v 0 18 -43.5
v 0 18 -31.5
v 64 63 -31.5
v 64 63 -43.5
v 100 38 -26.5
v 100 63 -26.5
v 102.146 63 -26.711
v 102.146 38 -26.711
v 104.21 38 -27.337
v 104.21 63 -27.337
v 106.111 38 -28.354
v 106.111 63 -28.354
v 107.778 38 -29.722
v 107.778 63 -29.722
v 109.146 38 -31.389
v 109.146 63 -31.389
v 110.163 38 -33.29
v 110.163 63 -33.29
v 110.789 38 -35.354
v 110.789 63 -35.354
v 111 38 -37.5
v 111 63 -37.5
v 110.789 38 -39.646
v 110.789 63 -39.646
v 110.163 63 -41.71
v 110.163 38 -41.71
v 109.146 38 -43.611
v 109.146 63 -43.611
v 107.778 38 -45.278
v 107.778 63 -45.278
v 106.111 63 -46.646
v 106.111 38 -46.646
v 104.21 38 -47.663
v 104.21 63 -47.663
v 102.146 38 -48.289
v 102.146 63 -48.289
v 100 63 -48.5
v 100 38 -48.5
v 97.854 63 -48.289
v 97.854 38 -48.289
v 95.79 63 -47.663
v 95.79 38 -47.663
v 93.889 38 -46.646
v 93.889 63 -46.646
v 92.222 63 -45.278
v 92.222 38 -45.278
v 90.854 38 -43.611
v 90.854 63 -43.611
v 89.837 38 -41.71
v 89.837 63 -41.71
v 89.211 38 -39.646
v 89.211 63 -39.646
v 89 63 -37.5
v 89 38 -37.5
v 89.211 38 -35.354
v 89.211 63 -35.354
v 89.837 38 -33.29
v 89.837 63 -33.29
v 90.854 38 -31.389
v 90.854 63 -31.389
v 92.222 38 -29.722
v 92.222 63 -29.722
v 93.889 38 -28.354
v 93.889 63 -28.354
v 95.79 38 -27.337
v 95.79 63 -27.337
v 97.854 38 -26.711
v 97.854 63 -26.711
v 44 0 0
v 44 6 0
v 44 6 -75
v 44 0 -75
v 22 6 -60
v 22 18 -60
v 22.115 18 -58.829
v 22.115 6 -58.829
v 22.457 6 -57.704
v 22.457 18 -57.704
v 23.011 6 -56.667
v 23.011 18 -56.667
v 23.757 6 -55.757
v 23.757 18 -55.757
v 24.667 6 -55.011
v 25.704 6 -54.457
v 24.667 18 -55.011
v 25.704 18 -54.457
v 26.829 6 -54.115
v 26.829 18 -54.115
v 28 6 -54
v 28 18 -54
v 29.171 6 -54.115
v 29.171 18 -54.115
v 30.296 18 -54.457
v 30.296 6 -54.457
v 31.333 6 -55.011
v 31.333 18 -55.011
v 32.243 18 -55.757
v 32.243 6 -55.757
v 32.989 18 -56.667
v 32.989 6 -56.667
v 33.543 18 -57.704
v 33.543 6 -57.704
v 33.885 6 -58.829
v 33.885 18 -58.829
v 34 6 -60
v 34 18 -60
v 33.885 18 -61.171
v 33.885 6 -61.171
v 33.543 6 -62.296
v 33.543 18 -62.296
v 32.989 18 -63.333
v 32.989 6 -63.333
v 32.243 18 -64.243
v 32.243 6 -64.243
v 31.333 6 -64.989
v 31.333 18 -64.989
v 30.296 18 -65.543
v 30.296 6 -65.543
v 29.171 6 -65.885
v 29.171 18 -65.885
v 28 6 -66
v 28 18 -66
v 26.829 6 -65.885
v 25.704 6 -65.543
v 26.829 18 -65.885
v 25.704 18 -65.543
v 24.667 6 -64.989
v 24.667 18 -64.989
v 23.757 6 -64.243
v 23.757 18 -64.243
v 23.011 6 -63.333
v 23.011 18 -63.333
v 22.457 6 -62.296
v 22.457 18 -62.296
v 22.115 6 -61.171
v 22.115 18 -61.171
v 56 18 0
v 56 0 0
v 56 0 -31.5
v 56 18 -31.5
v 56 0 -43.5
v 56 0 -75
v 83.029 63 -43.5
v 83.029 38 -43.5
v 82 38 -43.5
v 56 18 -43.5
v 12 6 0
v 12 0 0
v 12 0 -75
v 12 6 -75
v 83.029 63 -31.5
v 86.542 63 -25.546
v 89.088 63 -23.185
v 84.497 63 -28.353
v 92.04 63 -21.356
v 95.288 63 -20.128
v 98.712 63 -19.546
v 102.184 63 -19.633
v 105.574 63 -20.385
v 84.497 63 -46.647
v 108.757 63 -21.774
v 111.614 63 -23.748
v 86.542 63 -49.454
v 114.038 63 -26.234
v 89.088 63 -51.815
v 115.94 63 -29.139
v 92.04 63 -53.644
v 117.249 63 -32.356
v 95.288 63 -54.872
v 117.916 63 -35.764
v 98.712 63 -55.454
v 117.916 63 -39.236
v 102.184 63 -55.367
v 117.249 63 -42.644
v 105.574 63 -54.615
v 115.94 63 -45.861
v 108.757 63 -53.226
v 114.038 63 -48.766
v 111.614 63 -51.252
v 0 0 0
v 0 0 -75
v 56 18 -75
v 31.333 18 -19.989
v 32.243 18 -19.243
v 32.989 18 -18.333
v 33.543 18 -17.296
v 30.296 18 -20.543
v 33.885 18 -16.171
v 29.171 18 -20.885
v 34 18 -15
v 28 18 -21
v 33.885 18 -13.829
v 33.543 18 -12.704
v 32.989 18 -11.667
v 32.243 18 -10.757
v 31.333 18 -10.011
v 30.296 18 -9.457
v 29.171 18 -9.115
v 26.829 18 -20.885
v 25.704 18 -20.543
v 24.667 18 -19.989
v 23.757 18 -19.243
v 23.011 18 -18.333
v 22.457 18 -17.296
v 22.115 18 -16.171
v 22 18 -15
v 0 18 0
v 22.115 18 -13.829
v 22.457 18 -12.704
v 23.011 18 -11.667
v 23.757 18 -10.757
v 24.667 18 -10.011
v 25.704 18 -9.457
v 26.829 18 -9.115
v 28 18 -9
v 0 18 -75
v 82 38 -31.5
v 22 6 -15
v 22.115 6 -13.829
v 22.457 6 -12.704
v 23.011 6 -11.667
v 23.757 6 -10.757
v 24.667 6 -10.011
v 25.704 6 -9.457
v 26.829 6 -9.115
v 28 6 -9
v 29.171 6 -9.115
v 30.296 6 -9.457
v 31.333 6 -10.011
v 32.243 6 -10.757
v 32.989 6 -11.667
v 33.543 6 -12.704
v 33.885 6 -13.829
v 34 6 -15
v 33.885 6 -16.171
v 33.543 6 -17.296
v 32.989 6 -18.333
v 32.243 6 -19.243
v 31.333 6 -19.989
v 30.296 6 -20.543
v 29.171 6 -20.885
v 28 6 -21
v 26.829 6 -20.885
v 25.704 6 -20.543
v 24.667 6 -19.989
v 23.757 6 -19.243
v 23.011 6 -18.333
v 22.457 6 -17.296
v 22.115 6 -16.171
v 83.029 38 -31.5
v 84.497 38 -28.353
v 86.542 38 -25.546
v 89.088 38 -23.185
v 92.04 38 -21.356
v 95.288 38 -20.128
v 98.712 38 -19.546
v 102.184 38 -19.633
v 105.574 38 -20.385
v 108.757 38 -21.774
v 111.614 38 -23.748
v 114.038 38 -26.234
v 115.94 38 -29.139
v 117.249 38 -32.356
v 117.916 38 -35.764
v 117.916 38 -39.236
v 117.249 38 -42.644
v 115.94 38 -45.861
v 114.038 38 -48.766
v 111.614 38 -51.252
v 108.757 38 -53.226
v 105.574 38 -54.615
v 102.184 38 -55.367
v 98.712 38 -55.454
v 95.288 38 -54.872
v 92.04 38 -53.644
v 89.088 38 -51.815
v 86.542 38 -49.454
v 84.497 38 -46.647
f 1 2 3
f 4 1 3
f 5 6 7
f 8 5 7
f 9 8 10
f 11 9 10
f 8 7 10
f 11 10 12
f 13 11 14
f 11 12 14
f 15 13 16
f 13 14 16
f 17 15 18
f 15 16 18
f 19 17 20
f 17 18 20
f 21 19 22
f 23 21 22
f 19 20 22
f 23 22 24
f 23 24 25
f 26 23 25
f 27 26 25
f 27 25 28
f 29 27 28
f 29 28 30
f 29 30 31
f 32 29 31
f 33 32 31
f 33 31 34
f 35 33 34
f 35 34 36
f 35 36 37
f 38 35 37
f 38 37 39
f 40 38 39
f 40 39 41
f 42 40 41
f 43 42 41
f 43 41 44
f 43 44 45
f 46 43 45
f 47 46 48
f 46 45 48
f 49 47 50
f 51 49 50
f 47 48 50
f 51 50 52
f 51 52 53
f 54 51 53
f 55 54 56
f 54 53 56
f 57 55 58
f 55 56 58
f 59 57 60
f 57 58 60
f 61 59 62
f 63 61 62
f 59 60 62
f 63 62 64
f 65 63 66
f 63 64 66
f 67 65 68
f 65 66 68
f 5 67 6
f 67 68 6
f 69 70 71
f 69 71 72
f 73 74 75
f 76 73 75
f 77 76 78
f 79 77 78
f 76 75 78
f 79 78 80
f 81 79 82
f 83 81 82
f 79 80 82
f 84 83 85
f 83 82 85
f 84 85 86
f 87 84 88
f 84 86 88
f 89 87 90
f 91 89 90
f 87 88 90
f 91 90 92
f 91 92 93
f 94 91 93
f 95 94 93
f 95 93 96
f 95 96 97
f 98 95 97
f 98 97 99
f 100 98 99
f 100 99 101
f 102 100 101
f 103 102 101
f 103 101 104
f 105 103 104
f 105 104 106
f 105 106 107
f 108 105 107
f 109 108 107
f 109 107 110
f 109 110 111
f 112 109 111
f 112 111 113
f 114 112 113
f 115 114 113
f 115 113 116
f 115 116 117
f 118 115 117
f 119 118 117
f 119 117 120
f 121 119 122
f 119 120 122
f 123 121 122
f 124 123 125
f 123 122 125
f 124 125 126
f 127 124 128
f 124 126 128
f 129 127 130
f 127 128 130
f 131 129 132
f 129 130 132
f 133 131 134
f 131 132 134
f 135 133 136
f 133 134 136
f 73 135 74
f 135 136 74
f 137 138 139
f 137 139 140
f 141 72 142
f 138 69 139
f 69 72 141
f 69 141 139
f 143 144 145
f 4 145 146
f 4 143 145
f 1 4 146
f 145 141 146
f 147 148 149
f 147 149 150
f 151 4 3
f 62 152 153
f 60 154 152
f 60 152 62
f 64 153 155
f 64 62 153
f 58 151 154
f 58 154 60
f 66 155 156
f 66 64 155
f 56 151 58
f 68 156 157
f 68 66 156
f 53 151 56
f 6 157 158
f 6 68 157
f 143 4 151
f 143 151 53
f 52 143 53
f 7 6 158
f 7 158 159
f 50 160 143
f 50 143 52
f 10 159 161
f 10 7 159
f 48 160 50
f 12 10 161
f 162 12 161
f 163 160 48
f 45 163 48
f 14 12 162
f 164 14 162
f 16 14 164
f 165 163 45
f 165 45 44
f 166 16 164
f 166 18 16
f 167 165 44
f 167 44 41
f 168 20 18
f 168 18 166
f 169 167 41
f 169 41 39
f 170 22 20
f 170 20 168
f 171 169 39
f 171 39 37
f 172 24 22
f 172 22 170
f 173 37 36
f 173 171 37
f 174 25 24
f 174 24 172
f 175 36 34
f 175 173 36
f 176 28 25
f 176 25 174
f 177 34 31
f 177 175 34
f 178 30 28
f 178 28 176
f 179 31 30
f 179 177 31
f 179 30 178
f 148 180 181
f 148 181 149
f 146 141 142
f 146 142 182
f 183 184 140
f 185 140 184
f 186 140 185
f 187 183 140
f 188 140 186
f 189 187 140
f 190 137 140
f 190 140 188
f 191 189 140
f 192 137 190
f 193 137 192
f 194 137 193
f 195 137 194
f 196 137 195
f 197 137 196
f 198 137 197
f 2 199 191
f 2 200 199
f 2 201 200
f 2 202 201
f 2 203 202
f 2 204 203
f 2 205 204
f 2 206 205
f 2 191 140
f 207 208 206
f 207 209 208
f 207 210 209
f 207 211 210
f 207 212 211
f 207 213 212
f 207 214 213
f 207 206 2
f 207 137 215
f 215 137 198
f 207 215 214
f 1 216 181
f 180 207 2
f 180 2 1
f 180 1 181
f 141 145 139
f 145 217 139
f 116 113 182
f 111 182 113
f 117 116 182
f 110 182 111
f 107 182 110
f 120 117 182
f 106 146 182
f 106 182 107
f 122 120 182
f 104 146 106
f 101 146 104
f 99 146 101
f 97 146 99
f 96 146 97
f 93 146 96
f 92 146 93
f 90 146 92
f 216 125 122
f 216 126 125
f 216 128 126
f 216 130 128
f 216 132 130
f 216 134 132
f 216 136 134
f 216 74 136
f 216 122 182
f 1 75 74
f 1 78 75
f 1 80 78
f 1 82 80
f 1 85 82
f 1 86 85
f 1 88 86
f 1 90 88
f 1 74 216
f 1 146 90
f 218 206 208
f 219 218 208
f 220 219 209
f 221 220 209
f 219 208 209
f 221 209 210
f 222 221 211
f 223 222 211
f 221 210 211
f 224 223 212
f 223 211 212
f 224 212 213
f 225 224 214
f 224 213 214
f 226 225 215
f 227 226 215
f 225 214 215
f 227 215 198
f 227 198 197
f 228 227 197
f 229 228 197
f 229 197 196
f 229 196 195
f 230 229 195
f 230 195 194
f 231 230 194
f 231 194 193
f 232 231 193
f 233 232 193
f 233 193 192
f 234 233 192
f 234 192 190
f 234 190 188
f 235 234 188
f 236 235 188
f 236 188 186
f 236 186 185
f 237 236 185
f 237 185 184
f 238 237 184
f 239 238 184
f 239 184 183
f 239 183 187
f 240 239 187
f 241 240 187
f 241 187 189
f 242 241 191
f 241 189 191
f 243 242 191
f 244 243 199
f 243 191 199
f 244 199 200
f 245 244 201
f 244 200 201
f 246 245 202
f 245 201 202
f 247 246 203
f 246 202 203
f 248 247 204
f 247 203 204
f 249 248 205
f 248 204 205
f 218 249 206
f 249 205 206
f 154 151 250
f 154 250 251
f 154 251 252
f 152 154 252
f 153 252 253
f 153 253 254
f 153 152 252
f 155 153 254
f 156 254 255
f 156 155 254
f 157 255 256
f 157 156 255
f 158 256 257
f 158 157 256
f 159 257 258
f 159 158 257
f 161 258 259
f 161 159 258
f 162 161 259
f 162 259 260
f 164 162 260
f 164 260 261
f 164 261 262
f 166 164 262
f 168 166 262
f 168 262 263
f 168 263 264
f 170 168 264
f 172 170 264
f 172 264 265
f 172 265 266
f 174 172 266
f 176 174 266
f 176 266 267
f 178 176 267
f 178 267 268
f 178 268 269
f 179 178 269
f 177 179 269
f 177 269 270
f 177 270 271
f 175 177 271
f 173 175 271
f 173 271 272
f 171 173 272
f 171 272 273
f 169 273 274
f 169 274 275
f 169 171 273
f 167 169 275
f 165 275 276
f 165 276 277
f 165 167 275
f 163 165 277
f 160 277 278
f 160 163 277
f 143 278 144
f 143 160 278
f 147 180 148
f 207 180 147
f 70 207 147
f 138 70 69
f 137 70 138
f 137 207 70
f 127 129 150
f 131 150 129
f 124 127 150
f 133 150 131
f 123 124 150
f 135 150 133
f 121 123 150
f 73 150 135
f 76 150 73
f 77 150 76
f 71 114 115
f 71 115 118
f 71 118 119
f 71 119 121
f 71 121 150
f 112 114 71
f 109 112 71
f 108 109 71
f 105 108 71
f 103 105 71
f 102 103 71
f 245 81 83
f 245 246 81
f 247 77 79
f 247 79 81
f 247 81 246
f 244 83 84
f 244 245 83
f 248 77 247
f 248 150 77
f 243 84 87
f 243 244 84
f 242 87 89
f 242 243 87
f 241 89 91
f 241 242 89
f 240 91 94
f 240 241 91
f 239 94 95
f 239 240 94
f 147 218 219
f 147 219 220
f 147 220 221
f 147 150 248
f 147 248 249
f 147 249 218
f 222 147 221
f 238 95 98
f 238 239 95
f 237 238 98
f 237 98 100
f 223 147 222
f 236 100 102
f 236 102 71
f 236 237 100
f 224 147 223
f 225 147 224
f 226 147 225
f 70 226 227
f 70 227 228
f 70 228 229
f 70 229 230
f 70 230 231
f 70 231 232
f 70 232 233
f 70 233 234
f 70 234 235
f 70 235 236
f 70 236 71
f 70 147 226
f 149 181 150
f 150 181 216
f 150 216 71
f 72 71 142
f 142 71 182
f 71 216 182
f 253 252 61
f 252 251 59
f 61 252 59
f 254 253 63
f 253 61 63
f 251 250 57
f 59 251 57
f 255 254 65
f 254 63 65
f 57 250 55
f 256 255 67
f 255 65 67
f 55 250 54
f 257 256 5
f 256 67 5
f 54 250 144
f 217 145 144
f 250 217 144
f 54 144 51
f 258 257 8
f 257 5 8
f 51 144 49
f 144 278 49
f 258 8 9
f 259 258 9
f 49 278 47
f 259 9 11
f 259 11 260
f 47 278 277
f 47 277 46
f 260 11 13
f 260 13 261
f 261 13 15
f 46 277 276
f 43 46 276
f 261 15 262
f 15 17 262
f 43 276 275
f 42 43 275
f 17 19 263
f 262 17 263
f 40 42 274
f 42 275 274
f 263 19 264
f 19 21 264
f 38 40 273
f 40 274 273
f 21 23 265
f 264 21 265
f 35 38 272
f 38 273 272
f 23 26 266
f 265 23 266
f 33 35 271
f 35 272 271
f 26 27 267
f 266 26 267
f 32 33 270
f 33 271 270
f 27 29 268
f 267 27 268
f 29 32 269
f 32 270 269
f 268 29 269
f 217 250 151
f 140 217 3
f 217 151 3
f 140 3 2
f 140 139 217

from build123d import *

# Parameters (mm, degrees)
BOSS_EXTRUDE1_DEPTH = 75
SKETCH2_R           = 6
CUT_EXTRUDE1_DEPTH  = 96.315266353
BOSS_EXTRUDE2_DEPTH = 6
SKETCH4_R           = 18
BOSS_EXTRUDE3_DEPTH = 25
SKETCH5_R           = 11
CUT_EXTRUDE2_DEPTH  = 154.355795456


with BuildPart() as part:
    # Sketch1 → Boss-Extrude1 (new body)
    with BuildSketch(Plane.XY):
        Polygon((0, 0), (12, 0), (12, 6), (44, 6), (44, 0), (56, 0), (56, 18), (0, 18), align=None)
    extrude(amount=-BOSS_EXTRUDE1_DEPTH)

    # Sketch2 → Cut-Extrude1 (cut, through all)
    with BuildSketch(Plane(origin=(0, 18, 0), x_dir=(1, 0, 0), z_dir=(0, 1, 0))):
        with Locations(Location((28, 15, 0), (0, 0, 180))):
            Circle(SKETCH2_R)
        with Locations(Location((28, 60, 0), (0, 0, 180))):
            Circle(SKETCH2_R)
    extrude(amount=-CUT_EXTRUDE1_DEPTH, mode=Mode.SUBTRACT)

    # Sketch3 → Boss-Extrude2 (add, symmetric)
    with BuildSketch(Plane.XY.offset(-37.5)):
        Polygon((0, 18), (64, 63), (100, 63), (100, 38), (82, 38), (56, 0), (56, 18), align=None)
    extrude(amount=BOSS_EXTRUDE2_DEPTH, both=True)

    # Sketch4 → Boss-Extrude3 (add)
    with BuildSketch(Plane(origin=(0, 63, 0), x_dir=(1, 0, 0), z_dir=(0, 1, 0))):
        with Locations((100, 37.5)):
            Circle(SKETCH4_R)
    extrude(amount=-BOSS_EXTRUDE3_DEPTH)

    # Sketch5 → Cut-Extrude2 (cut, through all)
    with BuildSketch(Plane(origin=(0, 63, 0), x_dir=(1, 0, 0), z_dir=(0, 1, 0))):
        with Locations(Location((100, 37.5, 0), (0, 0, 270))):
            Circle(SKETCH5_R)
    extrude(amount=-CUT_EXTRUDE2_DEPTH, mode=Mode.SUBTRACT)


solid = part.part
